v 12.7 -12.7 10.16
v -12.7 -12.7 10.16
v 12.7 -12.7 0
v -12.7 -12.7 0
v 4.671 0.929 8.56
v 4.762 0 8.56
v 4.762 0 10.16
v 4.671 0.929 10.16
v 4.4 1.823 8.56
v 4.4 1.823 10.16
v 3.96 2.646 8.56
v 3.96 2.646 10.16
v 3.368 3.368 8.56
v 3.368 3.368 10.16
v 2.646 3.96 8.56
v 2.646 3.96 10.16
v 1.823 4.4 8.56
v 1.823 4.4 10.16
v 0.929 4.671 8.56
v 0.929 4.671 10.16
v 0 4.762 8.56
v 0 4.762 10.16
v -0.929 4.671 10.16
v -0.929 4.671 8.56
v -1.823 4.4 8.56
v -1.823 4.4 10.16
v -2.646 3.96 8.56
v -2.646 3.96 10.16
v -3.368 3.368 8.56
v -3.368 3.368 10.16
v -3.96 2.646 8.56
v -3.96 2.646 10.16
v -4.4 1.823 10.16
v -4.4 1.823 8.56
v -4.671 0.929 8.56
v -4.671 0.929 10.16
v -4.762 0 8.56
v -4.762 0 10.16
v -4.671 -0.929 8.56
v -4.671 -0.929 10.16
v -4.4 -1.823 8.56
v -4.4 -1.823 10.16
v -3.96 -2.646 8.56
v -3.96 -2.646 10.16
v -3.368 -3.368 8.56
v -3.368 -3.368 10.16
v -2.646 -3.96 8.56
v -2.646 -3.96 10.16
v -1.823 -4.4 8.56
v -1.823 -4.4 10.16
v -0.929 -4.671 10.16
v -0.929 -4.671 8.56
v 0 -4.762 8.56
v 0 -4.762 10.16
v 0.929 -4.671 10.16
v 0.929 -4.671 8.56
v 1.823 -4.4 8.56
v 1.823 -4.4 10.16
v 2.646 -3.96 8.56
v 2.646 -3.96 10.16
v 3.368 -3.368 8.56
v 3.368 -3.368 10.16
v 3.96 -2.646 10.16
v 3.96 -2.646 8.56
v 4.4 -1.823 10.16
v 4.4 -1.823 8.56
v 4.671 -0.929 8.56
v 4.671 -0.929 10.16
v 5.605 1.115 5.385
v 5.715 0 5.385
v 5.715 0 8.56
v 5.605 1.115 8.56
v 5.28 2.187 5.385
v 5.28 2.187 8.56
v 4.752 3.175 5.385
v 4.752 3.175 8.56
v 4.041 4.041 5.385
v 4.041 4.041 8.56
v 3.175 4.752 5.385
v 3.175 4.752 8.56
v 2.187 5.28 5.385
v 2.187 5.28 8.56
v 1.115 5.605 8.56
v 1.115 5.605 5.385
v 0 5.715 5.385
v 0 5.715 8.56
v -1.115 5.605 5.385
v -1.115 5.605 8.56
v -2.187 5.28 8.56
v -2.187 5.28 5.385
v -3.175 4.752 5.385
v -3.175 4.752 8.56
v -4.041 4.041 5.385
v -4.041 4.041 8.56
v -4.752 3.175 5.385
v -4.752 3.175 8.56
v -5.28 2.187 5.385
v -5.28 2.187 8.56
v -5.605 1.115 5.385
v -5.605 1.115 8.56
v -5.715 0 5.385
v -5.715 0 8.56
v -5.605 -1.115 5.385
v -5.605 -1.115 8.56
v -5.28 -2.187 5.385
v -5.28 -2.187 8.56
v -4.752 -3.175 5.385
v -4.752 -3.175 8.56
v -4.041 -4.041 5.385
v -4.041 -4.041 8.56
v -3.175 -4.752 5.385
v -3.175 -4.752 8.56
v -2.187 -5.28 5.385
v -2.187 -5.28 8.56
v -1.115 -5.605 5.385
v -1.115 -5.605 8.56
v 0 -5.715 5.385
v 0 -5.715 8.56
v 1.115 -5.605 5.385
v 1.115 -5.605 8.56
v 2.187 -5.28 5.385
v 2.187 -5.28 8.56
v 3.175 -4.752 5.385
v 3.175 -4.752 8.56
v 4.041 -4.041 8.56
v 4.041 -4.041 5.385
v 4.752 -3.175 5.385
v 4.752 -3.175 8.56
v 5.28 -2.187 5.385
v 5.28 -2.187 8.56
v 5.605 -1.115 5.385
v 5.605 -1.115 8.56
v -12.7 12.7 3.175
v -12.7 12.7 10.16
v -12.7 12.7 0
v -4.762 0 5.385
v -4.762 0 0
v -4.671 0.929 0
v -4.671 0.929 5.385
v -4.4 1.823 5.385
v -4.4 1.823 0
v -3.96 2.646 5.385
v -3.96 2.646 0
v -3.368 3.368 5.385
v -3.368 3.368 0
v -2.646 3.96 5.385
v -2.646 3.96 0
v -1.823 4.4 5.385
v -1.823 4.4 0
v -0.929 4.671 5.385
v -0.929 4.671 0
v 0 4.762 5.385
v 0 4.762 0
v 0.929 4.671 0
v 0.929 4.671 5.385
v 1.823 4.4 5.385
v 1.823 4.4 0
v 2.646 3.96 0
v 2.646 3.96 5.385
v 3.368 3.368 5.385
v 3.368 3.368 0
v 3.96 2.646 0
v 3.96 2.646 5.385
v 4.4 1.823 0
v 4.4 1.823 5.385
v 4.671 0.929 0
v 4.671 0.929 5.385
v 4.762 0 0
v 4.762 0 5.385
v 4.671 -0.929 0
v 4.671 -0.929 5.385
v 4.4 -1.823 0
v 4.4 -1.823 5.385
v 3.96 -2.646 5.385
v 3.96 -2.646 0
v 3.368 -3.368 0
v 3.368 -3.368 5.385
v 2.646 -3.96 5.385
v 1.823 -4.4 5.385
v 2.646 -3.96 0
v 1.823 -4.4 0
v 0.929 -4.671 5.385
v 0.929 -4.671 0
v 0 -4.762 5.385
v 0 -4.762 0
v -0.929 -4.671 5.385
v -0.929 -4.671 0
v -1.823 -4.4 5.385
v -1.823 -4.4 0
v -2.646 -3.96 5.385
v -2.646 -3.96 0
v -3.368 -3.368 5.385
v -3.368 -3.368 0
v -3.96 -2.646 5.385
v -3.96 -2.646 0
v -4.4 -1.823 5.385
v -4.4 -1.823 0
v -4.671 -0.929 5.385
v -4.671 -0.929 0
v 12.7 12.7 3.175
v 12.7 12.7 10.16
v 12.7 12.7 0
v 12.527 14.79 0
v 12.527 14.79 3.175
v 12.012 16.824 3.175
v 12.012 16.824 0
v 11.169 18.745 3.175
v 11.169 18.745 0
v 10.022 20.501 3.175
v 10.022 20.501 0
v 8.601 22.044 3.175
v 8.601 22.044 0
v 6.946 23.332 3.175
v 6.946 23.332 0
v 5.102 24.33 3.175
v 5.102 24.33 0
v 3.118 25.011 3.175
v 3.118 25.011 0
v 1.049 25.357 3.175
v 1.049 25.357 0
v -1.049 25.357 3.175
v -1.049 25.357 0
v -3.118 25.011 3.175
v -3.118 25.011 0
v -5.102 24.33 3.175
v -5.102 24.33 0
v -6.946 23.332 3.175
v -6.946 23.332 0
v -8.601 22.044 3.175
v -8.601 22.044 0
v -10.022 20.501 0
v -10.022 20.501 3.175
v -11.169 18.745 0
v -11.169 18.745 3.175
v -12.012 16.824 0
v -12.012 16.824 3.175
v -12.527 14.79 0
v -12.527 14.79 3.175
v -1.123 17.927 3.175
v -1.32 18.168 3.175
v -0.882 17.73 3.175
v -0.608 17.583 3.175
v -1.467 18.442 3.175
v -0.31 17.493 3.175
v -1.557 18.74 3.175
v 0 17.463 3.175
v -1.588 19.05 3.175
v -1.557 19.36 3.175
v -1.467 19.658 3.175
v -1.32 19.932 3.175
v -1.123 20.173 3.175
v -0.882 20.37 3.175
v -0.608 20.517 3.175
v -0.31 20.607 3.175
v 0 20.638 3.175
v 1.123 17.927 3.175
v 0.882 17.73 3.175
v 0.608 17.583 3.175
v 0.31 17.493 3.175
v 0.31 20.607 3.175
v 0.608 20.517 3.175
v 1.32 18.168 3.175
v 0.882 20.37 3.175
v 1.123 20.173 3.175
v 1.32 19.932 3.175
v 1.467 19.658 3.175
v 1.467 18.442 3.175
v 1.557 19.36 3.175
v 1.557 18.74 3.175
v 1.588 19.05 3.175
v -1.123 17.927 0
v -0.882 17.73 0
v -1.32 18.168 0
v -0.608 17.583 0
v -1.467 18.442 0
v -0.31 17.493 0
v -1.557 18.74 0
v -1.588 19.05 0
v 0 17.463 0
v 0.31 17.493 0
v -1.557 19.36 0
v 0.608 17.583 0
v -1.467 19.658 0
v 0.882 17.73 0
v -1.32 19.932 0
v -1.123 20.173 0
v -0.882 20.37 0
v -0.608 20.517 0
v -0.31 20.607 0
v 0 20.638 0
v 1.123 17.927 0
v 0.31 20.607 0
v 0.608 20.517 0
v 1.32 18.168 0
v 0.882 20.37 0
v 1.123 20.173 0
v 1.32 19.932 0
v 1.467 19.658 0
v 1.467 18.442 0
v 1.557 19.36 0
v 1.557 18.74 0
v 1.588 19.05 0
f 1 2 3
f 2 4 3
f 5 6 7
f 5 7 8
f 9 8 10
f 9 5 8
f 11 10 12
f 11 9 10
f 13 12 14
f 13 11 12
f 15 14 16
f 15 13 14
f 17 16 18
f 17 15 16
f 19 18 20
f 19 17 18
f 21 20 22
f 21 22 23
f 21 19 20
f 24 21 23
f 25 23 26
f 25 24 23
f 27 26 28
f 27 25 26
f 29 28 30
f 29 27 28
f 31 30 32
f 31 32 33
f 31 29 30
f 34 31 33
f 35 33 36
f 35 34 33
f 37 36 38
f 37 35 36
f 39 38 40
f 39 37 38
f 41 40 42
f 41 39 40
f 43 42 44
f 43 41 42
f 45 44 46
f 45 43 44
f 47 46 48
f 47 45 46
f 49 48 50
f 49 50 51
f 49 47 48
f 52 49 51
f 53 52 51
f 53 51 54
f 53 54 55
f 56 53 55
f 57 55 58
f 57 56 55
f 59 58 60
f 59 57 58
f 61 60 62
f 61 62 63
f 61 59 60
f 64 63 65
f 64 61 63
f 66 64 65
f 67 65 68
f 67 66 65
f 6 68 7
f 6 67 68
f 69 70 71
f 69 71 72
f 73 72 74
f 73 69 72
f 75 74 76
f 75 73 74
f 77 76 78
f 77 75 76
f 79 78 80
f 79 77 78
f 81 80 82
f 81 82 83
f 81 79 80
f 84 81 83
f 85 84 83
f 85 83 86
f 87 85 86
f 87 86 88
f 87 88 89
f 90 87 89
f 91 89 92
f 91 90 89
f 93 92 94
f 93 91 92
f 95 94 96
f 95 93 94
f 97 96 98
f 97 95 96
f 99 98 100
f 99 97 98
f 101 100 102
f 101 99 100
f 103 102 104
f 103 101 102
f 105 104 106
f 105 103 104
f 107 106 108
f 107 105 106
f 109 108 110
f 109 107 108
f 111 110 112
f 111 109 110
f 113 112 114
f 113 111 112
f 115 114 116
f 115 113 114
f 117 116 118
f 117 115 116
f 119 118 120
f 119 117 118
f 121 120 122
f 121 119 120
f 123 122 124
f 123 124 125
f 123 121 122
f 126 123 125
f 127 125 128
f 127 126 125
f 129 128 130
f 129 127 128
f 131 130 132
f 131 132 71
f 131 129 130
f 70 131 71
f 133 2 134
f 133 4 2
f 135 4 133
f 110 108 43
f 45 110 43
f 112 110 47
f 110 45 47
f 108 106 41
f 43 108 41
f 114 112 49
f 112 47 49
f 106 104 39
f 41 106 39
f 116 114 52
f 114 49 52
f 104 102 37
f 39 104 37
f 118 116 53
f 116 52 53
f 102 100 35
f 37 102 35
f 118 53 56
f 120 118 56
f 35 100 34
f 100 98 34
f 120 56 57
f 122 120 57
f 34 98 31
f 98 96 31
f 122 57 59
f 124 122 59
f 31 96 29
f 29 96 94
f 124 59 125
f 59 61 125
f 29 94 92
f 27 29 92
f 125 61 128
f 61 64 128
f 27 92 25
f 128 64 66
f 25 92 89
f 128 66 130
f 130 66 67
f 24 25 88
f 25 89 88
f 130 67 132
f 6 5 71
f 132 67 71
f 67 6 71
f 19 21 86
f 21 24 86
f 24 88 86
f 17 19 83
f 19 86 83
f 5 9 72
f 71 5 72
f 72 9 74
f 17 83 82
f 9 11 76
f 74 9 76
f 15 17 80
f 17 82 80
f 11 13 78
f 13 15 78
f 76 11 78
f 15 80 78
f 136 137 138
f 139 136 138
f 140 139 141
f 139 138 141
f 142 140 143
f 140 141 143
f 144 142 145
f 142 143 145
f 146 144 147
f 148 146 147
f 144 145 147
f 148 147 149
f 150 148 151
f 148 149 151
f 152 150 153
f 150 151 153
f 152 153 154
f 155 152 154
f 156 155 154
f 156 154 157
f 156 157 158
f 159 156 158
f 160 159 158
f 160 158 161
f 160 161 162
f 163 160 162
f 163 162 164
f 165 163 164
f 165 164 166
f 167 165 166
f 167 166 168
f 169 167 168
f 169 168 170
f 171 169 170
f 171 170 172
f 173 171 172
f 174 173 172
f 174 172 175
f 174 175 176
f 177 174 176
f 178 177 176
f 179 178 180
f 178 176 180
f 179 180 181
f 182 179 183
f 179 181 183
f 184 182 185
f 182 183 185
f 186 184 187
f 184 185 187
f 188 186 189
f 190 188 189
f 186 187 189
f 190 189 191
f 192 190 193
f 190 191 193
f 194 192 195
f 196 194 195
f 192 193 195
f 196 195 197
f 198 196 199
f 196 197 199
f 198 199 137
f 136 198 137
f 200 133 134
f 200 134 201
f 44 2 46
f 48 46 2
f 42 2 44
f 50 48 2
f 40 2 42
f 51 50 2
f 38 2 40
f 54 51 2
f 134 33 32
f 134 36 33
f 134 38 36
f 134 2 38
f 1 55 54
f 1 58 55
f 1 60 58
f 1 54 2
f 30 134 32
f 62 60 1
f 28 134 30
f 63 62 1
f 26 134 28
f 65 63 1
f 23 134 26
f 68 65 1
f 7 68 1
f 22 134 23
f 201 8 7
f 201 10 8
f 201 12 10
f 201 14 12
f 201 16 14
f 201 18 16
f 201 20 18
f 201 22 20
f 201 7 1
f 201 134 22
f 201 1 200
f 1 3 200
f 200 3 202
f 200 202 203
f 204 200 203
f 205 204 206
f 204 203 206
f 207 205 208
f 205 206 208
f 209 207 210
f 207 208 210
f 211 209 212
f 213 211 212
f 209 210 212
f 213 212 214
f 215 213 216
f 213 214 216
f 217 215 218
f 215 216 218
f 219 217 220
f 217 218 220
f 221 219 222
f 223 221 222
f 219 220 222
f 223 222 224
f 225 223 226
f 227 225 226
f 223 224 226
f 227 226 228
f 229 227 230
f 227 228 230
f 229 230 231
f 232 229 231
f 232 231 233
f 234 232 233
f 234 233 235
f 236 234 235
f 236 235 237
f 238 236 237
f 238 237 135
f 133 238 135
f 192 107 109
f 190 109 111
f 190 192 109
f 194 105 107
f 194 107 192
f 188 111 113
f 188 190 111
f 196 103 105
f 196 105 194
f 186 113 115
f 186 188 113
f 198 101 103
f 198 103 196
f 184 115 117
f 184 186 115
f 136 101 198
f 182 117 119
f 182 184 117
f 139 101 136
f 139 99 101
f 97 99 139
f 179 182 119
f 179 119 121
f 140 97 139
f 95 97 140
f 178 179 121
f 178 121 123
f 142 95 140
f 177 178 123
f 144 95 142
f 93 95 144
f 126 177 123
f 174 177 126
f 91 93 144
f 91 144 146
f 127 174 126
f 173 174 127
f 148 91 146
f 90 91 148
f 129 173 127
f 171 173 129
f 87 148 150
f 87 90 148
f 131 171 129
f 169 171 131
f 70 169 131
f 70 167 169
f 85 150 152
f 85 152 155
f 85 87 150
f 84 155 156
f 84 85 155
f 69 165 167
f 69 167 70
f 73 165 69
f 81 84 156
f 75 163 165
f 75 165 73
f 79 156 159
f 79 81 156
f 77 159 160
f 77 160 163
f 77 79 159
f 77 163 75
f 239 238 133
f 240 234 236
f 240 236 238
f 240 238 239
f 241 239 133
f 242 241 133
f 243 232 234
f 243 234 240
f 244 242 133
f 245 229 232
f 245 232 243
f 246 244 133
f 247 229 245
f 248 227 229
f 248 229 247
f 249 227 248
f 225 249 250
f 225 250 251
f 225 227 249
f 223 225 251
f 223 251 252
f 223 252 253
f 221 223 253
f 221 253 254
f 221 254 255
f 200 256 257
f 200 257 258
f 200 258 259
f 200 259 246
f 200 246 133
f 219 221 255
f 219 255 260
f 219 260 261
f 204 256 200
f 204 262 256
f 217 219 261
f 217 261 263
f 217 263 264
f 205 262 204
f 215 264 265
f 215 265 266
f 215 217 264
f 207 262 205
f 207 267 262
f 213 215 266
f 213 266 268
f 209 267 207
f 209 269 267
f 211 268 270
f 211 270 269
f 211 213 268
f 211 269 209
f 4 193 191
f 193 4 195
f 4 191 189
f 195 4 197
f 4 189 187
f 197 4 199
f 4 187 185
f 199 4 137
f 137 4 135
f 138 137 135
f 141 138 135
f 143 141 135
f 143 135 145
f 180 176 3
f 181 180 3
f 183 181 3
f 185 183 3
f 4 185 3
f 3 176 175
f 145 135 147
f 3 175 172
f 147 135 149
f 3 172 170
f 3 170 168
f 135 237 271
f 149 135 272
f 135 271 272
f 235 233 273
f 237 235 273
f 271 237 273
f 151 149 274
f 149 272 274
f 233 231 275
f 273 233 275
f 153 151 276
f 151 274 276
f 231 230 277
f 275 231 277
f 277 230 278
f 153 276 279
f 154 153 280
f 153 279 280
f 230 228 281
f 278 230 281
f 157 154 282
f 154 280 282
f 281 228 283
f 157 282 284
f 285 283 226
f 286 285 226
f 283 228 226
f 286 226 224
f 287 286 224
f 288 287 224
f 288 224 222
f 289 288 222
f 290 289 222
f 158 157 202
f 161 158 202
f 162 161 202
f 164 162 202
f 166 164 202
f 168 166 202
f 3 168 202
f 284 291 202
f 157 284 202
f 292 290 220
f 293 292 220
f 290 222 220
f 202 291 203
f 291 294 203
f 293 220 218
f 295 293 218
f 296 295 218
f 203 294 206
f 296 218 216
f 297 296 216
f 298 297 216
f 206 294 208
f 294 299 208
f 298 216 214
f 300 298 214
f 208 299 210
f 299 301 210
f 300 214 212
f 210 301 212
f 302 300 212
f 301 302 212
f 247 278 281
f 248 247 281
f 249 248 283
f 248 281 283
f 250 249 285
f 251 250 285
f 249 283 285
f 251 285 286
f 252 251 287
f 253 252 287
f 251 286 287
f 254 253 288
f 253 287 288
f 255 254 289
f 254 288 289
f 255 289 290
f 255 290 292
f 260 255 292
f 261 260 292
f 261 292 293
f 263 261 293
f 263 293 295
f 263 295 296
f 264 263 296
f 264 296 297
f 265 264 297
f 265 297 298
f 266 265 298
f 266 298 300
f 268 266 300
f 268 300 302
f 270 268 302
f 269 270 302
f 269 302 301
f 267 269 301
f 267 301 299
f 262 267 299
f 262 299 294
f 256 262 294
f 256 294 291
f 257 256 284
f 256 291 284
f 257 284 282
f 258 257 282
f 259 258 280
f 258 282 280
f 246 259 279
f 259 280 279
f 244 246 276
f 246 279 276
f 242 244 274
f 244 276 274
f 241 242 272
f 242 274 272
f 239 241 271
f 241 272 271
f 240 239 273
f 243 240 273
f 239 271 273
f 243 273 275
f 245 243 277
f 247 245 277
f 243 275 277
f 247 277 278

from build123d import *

# Parameters (mm, degrees)
F1_DEPTH = 3.175
F2_W     = 25.4
F2_H     = 25.4
F3_DEPTH = 2.2098
F5_D     = 9.525
F6_W     = 25.4
F6_H     = 25.4
F6_R     = 5.715
F7_DEPTH = 3.175
F8_W     = 25.4
F8_H     = 25.4
F8_R     = 4.7625
F9_DEPTH = 1.6002
F11_D    = 3.175


with BuildPart() as f1:
    # F0 (on Top) → F1 (new body)
    with BuildSketch(Plane.XY):
        with BuildLine():
            Line((-12.7, -12.7), (12.7, -12.7))
            Line((12.7, -12.7), (12.7, 12.7))
            ThreePointArc((12.7, 12.7), (0, 25.4), (-12.7, 12.7))
            Line((-12.7, 12.7), (-12.7, -12.7))
        make_face()
    extrude(amount=F1_DEPTH)

    # F2 (on face) → F3 (join)
    with BuildSketch(Plane.XY.offset(3.175)):
        Rectangle(F2_W, F2_H)
    extrude(amount=F3_DEPTH)

    # F5 (through all)
    with Locations(Plane.XY.offset(5.3848)):
        with Locations((0, 0)):
            Hole(F5_D / 2)

    # F6 (on face) → F7 (join)
    with BuildSketch(Plane.XY.offset(5.3848)):
        Rectangle(F6_W, F6_H)
        Circle(F6_R, mode=Mode.SUBTRACT)
    extrude(amount=F7_DEPTH)

    # F8 (on face) → F9 (join)
    with BuildSketch(Plane.XY.offset(8.5598)):
        Rectangle(F8_W, F8_H)
        Circle(F8_R, mode=Mode.SUBTRACT)
    extrude(amount=F9_DEPTH)

    # F11 (through all)
    with Locations(Plane.XY.offset(3.175)):
        with Locations((0, 19.05)):
            Hole(F11_D / 2)


solid = f1.part
